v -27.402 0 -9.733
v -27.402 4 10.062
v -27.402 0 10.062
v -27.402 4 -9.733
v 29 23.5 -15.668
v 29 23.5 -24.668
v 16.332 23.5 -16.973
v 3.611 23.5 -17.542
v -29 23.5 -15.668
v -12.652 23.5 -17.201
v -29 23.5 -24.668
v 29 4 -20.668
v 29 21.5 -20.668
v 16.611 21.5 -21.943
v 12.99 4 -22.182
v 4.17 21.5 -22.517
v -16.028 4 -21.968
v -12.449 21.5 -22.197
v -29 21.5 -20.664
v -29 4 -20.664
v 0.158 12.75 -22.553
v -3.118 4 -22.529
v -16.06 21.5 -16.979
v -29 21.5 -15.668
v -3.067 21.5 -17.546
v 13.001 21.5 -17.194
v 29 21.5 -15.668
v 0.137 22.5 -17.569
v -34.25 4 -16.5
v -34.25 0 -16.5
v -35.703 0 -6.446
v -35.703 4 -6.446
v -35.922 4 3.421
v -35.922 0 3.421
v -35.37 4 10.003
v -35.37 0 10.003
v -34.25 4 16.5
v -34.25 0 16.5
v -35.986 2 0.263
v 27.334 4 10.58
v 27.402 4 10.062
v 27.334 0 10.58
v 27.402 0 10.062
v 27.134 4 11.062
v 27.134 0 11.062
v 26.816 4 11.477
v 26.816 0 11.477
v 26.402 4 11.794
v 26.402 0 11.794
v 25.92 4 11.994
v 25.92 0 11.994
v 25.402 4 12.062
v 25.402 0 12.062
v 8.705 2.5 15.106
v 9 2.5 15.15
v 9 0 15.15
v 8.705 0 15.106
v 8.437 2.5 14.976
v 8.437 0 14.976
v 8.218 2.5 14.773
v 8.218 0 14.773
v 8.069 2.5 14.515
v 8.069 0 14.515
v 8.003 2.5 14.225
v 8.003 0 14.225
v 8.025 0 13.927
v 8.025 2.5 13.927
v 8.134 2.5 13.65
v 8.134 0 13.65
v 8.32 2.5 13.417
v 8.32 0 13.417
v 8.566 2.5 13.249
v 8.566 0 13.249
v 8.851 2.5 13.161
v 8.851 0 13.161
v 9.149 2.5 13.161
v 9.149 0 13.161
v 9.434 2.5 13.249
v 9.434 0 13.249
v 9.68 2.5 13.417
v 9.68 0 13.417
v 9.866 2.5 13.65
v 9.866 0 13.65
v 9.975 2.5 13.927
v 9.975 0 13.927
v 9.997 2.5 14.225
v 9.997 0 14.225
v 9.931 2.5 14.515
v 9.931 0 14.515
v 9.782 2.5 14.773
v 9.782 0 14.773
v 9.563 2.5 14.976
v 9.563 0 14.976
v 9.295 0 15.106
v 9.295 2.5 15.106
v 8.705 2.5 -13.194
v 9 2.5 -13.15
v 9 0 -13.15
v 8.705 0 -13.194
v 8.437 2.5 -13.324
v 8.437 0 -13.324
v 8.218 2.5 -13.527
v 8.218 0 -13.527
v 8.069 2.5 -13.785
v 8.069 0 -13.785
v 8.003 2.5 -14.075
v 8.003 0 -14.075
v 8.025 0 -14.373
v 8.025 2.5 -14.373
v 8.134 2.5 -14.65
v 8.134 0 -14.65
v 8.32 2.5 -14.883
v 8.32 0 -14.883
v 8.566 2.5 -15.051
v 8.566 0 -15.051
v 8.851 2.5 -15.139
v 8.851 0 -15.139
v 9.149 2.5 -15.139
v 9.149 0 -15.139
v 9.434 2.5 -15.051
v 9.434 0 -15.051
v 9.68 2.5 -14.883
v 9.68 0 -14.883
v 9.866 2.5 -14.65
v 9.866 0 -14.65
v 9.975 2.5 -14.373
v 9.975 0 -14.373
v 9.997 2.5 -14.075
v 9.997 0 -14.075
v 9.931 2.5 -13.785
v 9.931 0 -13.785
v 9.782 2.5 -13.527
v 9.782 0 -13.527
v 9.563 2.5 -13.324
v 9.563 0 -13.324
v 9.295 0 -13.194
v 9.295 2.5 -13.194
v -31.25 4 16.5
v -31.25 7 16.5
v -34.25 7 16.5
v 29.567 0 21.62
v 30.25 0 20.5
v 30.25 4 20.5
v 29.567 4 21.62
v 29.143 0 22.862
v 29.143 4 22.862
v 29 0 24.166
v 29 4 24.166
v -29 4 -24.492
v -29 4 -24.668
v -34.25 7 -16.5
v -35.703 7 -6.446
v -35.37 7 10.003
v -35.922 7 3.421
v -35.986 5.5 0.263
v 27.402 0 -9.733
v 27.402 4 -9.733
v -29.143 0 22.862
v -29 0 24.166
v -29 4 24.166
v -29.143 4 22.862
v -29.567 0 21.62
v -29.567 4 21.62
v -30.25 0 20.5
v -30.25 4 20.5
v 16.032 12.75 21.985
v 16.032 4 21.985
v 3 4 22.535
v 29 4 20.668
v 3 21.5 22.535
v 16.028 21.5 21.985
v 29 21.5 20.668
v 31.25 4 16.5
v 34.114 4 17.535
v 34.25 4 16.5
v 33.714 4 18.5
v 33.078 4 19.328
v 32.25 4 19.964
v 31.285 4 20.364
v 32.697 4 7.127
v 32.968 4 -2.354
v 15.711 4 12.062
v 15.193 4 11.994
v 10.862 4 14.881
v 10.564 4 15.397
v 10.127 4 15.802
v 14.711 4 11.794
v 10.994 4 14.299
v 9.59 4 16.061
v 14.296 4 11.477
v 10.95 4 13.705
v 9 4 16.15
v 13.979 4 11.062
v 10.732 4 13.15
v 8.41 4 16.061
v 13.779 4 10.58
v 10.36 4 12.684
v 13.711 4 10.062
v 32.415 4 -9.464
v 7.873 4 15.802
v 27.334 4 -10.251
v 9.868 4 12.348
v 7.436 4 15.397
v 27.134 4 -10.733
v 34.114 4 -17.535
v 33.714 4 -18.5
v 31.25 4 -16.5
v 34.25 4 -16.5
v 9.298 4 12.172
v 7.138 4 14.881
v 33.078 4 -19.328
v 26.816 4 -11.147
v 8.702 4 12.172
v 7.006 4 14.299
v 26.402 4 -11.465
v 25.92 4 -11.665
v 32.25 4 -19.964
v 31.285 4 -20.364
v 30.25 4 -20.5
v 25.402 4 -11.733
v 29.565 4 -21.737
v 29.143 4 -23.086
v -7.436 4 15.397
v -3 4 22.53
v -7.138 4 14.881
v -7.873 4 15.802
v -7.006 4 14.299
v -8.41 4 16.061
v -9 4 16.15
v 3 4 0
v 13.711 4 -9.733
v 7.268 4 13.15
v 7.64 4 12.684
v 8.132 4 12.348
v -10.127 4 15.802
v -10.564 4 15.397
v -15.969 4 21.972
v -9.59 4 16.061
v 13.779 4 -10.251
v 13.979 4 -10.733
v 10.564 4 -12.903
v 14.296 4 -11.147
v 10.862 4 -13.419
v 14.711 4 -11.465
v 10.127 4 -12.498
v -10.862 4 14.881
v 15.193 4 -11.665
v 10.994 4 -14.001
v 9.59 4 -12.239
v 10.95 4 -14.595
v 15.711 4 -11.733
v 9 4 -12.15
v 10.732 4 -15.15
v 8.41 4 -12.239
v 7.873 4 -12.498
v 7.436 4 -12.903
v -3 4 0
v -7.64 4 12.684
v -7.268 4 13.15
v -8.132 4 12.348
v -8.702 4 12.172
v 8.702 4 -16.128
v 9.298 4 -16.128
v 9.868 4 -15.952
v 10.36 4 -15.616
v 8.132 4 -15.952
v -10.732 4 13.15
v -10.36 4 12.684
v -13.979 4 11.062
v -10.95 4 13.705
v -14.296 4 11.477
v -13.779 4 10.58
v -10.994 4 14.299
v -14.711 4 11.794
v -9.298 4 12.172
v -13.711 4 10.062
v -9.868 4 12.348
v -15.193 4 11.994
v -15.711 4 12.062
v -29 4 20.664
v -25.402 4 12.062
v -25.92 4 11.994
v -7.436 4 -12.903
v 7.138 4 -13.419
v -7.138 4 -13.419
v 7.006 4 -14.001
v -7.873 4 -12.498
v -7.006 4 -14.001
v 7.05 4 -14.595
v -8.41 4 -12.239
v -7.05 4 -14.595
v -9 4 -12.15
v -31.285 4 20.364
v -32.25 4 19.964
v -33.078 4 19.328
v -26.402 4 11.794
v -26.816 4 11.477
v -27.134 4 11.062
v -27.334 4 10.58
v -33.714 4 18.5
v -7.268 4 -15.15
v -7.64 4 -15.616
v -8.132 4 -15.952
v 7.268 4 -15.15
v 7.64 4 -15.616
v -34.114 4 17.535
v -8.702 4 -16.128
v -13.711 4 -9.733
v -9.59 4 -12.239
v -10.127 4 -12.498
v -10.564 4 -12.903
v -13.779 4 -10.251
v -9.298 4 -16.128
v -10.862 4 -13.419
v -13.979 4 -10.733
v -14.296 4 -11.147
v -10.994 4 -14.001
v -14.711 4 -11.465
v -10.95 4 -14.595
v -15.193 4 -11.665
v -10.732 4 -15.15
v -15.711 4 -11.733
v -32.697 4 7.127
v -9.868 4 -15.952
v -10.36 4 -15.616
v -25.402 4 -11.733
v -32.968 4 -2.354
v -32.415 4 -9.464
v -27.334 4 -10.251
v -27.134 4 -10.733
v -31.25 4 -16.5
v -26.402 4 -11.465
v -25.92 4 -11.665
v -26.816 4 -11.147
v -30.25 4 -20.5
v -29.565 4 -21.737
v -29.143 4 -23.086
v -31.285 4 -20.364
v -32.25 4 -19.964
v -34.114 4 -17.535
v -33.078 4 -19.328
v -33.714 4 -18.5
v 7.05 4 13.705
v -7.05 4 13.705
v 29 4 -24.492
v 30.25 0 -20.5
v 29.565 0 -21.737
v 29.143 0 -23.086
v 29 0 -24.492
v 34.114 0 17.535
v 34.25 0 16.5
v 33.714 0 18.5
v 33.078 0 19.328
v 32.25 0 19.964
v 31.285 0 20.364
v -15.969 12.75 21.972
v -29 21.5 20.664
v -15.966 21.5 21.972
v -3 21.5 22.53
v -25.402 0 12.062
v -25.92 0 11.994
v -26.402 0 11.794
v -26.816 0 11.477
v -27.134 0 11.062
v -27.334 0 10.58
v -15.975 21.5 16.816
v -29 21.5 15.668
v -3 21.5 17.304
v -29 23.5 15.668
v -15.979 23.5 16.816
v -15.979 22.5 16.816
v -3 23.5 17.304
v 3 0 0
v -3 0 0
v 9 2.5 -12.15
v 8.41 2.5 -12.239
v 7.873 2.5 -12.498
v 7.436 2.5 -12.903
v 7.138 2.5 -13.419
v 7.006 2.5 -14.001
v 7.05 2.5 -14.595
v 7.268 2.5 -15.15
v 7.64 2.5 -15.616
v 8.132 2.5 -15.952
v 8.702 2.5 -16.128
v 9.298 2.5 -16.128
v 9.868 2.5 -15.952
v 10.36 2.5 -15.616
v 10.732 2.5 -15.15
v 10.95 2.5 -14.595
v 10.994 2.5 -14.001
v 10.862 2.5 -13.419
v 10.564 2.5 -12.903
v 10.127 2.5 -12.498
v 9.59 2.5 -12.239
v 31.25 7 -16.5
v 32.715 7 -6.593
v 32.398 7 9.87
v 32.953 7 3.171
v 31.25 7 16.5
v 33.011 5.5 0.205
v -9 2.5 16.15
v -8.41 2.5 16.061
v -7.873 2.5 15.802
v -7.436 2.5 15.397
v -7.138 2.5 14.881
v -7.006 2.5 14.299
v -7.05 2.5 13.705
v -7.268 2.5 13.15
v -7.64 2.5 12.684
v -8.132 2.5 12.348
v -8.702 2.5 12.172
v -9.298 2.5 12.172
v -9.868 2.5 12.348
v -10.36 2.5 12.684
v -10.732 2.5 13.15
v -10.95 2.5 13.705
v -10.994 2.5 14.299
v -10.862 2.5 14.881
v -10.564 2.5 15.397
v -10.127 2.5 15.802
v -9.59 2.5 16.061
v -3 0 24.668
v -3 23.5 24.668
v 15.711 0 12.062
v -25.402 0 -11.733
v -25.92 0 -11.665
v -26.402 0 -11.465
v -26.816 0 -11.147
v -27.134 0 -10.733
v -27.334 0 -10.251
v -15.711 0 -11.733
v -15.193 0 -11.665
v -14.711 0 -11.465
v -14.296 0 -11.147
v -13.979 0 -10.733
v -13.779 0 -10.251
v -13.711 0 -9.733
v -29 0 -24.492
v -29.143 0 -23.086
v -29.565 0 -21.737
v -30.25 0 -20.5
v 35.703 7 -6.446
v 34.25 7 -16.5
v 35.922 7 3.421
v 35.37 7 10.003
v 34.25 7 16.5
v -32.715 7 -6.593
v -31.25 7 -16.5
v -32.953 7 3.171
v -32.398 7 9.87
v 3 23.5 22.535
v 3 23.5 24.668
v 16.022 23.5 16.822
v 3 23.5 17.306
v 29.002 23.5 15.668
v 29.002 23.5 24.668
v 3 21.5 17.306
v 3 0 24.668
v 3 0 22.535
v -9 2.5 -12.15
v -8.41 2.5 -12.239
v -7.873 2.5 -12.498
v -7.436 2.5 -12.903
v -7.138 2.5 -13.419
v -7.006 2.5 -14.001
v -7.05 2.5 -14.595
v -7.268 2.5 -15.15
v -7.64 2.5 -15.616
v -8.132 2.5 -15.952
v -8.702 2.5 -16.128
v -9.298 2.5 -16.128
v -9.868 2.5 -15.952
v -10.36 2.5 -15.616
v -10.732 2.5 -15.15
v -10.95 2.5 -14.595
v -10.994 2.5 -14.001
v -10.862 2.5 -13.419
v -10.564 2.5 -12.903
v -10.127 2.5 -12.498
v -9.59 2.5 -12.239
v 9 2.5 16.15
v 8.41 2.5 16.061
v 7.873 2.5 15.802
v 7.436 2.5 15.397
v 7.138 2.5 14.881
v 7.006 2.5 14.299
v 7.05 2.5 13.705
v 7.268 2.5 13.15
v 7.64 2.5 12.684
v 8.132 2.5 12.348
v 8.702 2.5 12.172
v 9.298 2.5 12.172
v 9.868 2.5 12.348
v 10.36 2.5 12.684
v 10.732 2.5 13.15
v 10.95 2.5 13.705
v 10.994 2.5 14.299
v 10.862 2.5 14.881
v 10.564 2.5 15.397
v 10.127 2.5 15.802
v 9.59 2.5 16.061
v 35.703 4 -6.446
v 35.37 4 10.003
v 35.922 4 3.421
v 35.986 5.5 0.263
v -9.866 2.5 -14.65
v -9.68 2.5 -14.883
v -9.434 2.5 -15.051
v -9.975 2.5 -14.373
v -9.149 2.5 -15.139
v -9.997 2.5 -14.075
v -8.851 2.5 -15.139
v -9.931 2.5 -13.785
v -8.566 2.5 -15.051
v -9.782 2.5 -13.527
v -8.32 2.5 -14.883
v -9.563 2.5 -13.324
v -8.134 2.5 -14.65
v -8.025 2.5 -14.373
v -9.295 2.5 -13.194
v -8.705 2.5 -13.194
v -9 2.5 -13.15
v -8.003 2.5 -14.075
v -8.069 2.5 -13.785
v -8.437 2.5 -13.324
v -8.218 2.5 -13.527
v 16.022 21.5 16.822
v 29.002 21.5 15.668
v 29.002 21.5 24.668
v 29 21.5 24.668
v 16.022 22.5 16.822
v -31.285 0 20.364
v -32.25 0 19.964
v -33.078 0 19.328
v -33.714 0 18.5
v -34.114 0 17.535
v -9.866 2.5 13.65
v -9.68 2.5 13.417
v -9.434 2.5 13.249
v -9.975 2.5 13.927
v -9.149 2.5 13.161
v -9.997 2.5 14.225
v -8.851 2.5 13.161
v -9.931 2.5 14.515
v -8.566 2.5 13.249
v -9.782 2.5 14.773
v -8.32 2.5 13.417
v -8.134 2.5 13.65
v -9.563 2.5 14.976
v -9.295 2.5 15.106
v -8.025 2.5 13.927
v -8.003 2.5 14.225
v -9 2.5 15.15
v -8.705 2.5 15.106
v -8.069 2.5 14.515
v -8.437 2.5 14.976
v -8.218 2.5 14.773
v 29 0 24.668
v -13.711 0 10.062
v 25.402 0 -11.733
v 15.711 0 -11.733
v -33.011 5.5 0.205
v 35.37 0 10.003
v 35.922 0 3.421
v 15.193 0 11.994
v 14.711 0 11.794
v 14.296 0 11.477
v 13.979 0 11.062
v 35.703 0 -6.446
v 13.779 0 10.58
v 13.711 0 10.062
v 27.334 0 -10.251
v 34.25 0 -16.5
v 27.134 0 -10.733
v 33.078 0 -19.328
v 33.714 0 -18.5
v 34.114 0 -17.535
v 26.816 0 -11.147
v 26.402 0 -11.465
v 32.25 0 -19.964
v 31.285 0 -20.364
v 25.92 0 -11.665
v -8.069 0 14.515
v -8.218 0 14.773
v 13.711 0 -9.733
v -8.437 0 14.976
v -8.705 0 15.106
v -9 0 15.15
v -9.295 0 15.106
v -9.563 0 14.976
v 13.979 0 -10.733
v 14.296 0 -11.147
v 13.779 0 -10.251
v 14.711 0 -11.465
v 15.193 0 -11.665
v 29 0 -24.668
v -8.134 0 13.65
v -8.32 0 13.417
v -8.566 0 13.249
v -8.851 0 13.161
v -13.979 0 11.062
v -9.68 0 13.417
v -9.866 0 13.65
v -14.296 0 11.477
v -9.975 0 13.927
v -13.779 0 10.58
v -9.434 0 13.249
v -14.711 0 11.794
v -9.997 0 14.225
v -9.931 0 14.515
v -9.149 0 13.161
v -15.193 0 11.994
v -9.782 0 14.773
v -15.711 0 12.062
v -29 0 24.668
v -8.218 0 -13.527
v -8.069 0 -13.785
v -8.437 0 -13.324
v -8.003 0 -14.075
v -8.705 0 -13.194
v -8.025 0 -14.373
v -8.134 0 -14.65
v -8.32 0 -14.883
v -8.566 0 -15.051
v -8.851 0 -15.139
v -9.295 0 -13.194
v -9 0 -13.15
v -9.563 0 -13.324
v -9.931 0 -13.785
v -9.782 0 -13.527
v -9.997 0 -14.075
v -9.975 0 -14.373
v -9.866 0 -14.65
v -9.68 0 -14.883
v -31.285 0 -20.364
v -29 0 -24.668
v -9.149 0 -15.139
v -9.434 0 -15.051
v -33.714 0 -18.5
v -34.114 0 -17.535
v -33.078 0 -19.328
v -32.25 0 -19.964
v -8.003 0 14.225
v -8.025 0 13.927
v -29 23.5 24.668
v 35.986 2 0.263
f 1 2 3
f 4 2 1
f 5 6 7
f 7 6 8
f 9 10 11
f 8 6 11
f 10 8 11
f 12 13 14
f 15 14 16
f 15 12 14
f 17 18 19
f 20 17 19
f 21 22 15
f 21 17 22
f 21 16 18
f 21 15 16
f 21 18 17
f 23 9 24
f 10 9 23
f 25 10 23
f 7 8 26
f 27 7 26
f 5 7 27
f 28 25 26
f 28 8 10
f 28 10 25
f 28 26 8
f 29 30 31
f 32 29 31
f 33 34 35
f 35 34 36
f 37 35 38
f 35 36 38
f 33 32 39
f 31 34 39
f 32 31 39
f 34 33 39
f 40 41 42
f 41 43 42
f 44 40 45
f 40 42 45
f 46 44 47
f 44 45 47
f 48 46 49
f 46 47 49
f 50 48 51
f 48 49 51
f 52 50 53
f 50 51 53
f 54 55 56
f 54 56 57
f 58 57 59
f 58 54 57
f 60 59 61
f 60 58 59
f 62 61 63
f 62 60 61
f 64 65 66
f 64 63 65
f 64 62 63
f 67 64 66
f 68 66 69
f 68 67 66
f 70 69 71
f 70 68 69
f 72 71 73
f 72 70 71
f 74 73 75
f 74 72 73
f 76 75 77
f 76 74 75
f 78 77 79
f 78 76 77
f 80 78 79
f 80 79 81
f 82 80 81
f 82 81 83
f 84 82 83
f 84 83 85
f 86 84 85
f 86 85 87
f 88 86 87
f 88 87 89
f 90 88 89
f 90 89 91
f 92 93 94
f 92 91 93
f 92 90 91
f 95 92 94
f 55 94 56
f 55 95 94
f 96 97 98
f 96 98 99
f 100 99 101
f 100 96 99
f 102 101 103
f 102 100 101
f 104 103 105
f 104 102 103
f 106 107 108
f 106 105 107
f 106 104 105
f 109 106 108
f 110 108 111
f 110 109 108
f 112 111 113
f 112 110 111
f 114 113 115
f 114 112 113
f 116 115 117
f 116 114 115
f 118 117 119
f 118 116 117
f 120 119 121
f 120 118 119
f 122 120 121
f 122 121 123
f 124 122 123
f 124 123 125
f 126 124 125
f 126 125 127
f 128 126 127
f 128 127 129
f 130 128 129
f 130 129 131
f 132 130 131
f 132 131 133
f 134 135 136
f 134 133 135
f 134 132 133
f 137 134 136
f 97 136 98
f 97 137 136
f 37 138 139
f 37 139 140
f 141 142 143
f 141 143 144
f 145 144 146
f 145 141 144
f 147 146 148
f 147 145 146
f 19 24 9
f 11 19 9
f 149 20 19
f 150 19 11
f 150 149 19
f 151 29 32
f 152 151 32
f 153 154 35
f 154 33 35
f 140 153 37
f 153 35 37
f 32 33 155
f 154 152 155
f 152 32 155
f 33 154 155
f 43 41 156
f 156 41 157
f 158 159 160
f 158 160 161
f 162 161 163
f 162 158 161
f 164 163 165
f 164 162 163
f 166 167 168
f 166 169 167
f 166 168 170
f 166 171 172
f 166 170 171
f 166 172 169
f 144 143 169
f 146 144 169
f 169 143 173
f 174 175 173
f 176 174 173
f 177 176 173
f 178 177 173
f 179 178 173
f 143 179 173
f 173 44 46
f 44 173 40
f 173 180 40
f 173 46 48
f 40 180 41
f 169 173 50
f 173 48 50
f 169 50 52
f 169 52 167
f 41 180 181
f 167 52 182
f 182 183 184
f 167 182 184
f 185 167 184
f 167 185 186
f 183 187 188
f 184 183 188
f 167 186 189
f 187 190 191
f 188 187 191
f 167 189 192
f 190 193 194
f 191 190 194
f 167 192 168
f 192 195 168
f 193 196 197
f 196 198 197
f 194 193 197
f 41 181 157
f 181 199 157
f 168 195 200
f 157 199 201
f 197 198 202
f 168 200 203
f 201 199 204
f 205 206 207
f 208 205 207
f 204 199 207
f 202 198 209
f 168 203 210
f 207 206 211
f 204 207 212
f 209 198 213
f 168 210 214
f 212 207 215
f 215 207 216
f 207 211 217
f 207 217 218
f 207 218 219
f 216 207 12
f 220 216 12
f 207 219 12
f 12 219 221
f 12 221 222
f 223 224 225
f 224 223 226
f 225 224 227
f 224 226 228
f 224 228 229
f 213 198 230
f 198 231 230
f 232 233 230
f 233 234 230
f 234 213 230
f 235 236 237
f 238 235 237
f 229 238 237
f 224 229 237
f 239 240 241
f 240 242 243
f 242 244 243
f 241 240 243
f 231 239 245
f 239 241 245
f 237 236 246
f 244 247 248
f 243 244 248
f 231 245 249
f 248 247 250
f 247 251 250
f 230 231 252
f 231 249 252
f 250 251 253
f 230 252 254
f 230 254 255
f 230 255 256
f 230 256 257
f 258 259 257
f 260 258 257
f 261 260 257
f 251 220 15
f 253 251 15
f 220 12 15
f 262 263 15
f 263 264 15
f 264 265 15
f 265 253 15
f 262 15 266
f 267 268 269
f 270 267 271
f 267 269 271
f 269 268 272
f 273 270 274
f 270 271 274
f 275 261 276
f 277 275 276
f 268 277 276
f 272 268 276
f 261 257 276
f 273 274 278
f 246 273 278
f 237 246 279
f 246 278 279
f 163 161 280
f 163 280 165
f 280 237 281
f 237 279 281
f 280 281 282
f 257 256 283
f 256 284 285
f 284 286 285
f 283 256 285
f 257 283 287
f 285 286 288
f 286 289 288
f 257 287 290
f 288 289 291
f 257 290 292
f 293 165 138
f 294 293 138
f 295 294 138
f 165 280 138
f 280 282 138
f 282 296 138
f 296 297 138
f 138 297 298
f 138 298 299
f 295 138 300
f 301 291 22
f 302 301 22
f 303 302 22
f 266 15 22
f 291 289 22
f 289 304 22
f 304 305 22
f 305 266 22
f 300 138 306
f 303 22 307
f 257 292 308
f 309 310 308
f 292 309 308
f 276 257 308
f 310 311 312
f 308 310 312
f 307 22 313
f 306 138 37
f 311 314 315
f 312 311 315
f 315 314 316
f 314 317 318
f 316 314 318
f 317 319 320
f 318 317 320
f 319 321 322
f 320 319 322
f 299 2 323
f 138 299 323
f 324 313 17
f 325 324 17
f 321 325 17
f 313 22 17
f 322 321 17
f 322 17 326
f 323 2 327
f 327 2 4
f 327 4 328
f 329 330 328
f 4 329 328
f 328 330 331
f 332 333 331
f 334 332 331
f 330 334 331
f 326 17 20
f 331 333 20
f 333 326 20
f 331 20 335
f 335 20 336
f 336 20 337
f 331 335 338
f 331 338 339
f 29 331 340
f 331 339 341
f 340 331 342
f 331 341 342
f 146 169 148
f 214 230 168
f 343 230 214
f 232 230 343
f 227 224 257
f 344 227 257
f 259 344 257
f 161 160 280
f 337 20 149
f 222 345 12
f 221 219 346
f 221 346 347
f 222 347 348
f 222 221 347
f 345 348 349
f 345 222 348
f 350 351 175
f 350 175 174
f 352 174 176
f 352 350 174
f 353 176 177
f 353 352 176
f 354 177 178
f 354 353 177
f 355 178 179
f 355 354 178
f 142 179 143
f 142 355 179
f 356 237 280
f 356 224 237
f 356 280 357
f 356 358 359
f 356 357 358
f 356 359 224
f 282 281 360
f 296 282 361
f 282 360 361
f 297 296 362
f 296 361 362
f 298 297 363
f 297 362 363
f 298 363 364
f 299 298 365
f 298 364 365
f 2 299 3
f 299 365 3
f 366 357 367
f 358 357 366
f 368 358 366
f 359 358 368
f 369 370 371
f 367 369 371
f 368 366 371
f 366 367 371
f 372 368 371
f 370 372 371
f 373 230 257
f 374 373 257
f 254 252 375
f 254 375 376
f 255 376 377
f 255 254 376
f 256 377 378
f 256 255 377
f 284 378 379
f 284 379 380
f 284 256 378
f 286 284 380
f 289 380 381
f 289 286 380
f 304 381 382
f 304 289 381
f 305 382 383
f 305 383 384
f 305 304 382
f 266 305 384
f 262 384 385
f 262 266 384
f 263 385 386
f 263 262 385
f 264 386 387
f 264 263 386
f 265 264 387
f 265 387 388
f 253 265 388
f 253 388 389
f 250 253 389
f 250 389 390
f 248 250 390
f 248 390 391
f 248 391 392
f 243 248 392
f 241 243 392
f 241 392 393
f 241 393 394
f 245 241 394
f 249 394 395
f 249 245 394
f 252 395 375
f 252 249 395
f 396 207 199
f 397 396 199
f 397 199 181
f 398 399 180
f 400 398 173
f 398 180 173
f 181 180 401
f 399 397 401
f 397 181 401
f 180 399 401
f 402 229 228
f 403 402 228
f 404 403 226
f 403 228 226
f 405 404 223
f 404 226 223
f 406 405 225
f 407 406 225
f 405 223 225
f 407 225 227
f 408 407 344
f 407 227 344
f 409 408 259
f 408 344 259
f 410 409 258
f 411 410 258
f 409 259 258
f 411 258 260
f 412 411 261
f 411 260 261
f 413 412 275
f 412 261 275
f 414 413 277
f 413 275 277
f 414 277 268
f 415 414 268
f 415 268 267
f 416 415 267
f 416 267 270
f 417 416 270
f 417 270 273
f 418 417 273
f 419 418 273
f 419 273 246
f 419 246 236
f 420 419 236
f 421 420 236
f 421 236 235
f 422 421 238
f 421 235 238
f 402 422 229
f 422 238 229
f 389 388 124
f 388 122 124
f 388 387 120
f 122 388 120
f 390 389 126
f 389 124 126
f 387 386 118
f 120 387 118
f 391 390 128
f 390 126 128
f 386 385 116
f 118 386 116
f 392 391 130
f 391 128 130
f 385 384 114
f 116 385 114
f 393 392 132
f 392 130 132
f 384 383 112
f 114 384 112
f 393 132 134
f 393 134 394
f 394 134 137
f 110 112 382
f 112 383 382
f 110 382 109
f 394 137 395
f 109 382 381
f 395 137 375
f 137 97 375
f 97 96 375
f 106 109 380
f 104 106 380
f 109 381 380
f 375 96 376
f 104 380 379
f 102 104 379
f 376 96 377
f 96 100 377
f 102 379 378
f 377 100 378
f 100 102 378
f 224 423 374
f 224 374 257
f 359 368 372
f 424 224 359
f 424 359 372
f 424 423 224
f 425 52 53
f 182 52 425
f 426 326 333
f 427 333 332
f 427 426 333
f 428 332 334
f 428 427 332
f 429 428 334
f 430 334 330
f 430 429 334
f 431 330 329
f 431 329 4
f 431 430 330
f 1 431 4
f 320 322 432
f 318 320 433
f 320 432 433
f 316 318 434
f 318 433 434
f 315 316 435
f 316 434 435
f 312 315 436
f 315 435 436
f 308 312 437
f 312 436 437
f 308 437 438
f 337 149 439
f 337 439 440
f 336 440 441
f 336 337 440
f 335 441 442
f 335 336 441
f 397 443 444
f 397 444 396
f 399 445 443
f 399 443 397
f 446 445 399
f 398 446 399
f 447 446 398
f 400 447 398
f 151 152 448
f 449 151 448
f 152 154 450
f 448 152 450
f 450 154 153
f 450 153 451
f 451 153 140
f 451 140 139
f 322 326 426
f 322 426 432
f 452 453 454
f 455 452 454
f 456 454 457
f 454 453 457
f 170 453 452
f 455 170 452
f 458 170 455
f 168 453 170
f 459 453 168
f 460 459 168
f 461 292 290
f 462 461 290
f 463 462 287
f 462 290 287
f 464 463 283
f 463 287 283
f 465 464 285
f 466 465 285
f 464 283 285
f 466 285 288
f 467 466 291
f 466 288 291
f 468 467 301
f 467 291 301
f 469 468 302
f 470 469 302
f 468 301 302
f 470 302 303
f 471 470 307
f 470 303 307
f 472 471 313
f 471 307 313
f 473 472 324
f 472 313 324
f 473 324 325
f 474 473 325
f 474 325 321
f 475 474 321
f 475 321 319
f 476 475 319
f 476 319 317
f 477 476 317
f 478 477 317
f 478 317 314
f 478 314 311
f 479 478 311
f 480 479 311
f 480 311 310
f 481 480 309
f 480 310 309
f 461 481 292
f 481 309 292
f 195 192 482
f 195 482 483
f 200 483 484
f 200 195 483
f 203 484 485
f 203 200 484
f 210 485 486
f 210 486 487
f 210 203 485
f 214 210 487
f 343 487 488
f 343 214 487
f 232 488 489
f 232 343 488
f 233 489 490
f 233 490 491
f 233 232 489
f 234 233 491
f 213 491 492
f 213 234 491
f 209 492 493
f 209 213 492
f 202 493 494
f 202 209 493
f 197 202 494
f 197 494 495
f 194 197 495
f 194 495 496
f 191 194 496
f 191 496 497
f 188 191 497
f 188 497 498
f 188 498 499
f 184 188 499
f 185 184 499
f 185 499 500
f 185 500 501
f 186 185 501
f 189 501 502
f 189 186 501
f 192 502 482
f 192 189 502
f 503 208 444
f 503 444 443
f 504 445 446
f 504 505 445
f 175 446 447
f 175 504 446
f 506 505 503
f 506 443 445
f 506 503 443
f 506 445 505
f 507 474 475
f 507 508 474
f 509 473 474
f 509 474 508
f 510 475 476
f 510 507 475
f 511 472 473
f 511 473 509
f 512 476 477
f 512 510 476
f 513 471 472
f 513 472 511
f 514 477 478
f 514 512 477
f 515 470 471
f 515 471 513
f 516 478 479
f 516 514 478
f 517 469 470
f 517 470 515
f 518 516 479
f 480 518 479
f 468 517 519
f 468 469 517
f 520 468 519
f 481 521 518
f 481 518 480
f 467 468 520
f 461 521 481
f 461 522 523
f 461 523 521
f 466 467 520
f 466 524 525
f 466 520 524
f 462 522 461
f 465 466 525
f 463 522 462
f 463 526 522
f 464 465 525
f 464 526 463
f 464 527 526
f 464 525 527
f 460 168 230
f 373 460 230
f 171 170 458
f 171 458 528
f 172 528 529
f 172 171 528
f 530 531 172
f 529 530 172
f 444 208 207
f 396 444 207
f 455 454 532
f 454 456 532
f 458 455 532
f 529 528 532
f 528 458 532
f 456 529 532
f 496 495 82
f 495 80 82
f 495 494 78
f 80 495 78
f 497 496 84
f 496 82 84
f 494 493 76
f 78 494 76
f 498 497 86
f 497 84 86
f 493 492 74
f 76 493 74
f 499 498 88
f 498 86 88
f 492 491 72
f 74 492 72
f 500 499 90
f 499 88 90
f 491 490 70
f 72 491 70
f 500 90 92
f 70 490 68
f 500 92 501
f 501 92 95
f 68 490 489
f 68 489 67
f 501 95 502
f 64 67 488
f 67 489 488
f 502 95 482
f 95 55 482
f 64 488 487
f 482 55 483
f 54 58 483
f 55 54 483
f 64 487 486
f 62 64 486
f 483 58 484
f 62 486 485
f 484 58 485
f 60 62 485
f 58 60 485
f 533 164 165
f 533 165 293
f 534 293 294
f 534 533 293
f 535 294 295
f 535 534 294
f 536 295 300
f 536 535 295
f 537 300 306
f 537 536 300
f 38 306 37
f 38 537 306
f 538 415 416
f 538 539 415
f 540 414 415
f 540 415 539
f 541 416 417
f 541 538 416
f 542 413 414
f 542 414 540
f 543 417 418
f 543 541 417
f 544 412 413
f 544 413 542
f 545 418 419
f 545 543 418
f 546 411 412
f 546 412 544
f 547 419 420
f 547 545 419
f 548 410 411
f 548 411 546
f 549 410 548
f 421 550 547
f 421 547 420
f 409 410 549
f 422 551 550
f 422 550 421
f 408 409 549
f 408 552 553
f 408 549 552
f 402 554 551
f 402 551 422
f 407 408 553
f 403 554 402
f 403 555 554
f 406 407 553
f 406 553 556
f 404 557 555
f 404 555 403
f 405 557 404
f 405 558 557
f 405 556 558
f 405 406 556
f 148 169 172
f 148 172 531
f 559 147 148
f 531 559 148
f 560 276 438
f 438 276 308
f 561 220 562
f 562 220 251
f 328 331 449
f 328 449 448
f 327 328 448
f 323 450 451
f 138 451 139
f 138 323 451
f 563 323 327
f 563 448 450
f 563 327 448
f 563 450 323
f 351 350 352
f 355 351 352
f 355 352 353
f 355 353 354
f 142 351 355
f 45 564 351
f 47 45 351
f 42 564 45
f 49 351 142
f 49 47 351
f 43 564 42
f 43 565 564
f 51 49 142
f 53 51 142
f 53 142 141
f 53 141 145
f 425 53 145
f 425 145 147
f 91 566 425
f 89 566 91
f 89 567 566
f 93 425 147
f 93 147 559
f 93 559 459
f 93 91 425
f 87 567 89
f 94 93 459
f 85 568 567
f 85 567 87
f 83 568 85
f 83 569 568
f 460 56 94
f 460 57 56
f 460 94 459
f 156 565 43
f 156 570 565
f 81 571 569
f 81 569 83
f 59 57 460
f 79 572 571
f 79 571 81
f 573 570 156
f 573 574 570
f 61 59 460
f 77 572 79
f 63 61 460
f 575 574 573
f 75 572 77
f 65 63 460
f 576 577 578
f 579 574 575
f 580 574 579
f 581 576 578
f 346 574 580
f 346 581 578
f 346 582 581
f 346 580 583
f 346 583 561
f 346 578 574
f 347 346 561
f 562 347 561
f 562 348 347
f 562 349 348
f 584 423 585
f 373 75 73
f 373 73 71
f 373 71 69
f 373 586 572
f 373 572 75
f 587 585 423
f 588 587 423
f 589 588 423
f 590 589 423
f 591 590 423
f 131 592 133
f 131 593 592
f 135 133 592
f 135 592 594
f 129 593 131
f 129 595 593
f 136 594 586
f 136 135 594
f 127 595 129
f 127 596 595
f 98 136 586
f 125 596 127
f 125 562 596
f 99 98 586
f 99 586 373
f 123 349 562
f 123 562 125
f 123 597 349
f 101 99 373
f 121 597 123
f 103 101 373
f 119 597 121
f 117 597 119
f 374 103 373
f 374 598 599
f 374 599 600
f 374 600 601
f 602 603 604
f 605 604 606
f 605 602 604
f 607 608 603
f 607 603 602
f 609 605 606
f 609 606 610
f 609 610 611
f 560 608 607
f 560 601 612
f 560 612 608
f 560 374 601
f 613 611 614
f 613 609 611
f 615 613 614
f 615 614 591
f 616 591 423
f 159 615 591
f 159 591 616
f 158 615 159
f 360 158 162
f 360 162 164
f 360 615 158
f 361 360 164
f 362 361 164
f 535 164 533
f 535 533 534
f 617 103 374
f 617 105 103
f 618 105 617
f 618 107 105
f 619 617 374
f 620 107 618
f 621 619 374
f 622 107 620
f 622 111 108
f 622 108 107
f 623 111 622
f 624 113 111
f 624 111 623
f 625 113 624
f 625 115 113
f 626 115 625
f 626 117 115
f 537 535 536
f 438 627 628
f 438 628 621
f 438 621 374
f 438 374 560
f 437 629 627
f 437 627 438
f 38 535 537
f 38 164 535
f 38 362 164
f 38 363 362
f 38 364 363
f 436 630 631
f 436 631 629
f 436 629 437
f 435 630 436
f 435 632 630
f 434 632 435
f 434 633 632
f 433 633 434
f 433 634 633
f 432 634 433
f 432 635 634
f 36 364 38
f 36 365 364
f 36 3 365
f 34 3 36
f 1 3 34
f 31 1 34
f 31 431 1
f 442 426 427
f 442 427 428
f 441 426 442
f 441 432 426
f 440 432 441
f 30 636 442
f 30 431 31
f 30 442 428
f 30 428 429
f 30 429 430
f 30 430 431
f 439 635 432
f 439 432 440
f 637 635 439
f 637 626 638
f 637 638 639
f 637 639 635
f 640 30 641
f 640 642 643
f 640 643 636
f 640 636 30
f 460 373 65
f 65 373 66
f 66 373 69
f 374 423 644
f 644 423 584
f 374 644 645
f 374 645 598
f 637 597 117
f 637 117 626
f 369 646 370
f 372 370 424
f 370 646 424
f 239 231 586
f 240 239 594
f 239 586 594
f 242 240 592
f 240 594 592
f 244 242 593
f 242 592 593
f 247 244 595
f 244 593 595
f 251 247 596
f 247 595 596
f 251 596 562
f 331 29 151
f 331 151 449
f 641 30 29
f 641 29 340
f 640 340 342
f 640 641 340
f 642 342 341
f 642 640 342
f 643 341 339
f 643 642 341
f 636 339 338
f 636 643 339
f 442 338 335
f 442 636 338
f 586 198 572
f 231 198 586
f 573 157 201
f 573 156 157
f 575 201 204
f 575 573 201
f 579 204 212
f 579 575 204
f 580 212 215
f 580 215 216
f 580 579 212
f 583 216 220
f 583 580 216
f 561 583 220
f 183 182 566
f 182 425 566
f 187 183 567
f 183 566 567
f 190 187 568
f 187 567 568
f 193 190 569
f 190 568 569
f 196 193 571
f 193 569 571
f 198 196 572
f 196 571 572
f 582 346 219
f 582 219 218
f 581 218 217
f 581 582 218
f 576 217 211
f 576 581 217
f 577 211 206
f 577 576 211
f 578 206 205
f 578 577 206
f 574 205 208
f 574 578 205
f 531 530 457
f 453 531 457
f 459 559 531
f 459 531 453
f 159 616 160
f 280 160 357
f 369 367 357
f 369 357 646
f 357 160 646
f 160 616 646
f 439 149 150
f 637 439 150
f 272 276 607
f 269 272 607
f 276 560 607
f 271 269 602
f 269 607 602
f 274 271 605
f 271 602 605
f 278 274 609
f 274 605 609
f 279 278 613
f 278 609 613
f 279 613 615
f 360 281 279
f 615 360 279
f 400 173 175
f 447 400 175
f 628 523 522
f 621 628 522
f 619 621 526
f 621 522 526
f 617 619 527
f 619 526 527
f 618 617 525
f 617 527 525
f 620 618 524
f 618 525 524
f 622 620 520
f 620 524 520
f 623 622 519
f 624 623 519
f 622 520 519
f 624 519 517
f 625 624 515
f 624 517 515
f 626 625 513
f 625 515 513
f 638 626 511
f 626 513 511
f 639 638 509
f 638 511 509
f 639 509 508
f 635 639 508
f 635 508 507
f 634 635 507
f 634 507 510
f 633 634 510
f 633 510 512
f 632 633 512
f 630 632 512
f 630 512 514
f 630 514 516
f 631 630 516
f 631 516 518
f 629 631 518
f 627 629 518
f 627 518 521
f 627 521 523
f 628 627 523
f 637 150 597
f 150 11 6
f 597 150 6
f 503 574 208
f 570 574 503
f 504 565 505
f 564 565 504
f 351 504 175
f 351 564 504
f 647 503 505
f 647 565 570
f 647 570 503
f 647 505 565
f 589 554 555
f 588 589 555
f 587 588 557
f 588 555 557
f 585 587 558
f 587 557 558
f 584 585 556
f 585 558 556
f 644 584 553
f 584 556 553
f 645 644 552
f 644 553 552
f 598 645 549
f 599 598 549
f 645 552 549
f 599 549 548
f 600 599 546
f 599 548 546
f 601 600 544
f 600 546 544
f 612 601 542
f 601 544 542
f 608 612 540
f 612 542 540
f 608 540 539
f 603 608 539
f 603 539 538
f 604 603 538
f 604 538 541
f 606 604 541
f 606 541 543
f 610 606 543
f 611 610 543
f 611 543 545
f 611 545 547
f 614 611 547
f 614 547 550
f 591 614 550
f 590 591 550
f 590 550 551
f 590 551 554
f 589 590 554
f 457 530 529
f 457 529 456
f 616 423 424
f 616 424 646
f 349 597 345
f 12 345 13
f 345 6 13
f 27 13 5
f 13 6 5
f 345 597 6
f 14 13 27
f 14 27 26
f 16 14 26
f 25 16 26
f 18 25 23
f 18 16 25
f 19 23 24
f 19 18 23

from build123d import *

# Parameters (mm, degrees)
BOSS_EXTRUDE1_DEPTH   = 4
CUT_EXTRUDE1_DEPTH    = 17
BOSS_EXTRUDE2_DEPTH   = 19.5
BOSS_EXTRUDE3_DEPTH   = 4
SKETCH6_W             = 58
SKETCH6_H             = 2
BOSS_EXTRUDE4_DEPTH   = 9
CUT_EXTRUDE2_DEPTH    = 7
FILLET1_R             = 7
BOSS_EXTRUDE5_DEPTH   = 23.5
SKETCH9_W             = 26
SKETCH9_H             = 2
SKETCH9_W_2           = 26.001587477
BOSS_EXTRUDE6_DEPTH   = 9
CUT_EXTRUDE3_DEPTH    = 10
SKETCH11_R            = 1
CUT_EXTRUDE4_DEPTH    = 10
SKETCH12_R            = 2
CUT_EXTRUDE5_DEPTH    = 1.5
SKETCH13_W            = 13.69136931
SKETCH13_H            = 23.795369164
CUT_EXTRUDE6_DEPTH    = 21.5
FILLET2_R             = 2
FILLET2_OF_MIRROR11_R = 2
FILLET3_R             = 6
BOSS_EXTRUDE7_DEPTH   = 7


with BuildPart() as part:
    # Sketch1 → Boss-Extrude1 (new body)
    with BuildSketch(Plane(origin=(0, 0, 0), x_dir=(1, 0, 0), z_dir=(0, 1, 0))):
        with BuildLine():
            ThreePointArc((30.25, 20.5), (33.078427125, 19.328427125), (34.25, 16.5))
            add(Edge.make_bspline(
                [(34.25, 16.5), (37.722666951, -0.526670932), (34.25, -16.5)],
                knots=[0, 0, 0, 0.709821526, 0.709821526, 0.709821526], degree=2))
            ThreePointArc((34.25, -16.5), (33.078427125, -19.328427125), (30.25, -20.5))
            add(Edge.make_bspline(
                [(-30.25, -20.5), (0.344261678, -24.605611324), (30.25, -20.5)],
                knots=[0, 0, 0, 0.814994135, 0.814994135, 0.814994135], degree=2))
            ThreePointArc((-30.25, -20.5), (-33.078427125, -19.328427125), (-34.25, -16.5))
            add(Edge.make_bspline(
                [(-34.25, 16.5), (-37.722666951, -0.526670933), (-34.25, -16.5)],
                knots=[0, 0, 0, 0.709821526, 0.709821526, 0.709821526], degree=2))
            ThreePointArc((-34.25, 16.5), (-33.078427125, 19.328427125), (-30.25, 20.5))
            add(Edge.make_bspline(
                [(-30.25, 20.5), (0.344261678, 24.605611324), (30.25, 20.5)],
                knots=[0, 0, 0, 0.814994135, 0.814994135, 0.814994135], degree=2))
        make_face()
    extrude(amount=BOSS_EXTRUDE1_DEPTH)

    # Sketch2 → Cut-Extrude1 (cut)
    with BuildSketch(Plane(origin=(0, 4, 0), x_dir=(1, 0, 0), z_dir=(0, 1, 0))):
        with BuildLine():
            Line((-3, 0), (-3, -22.530259042))
            add(Edge.make_bspline(
                [(-3, -22.530259042), (0.003385515, -22.572928062), (3, -22.534846829)],
                knots=[0, 0, 0, 1, 1, 1], degree=2))
            Line((3, -22.534846829), (3, 0))
            Line((3, 0), (-3, 0))
        make_face()
    extrude(amount=-CUT_EXTRUDE1_DEPTH, mode=Mode.SUBTRACT)



with BuildPart() as body_2:
    # Sketch3 → Boss-Extrude2 (new body)
    with BuildSketch(Plane(origin=(0, 4, 0), x_dir=(1, 0, 0), z_dir=(0, 1, 0))):
        with BuildLine():
            Line((-29, 20.664354546), (-29, 24.667980394))
            Line((-29, 24.667980394), (29, 24.667980394))
            Line((29, 24.667980394), (29, 20.667980394))
            add(Edge.make_bspline(
                [(29, 20.667980394), (0.316394821, 24.439442983), (-29, 20.664354546)],
                knots=[0, 0, 0, 1, 1, 1], degree=2))
        make_face()
    extrude(amount=BOSS_EXTRUDE2_DEPTH)


with BuildPart() as part_1:
    add(part.part)

    add(body_2.part)  # Boss-Extrude3 merges body 2
    # Sketch4 → Boss-Extrude3 (add)
    with BuildSketch(Plane.XZ.offset(-4)):
        with BuildLine():
            Line((-29.000000006, -20.664354545), (-29, -24.667980394))
            Line((-29, -24.667980394), (29, -24.667980394))
            Line((29, -24.667980394), (29, -20.667980394))
            add(Edge.make_bspline(
                [(29, -20.667980394), (0.316394818, -24.439442983), (-29.000000006, -20.664354545)],
                knots=[0, 0, 0, 1, 1, 1], degree=2))
        make_face()
    extrude(amount=BOSS_EXTRUDE3_DEPTH)

    # Sketch6 → Boss-Extrude4 (add)
    with BuildSketch(Plane(origin=(0, 0, -24.667980394), x_dir=(-1, 0, 0), z_dir=(0, 0, -1))):
        with Locations((0, 22.5)):
            Rectangle(SKETCH6_W, SKETCH6_H)
    extrude(amount=-BOSS_EXTRUDE4_DEPTH)

    # Sketch7 → Cut-Extrude2 (cut)
    with BuildSketch(Plane(origin=(0, 23.5, 0), x_dir=(1, 0, 0), z_dir=(0, 1, 0))):
        with BuildLine():
            Line((-29, 15.667980394), (29, 15.667980394))
            add(Edge.make_bspline(
                [(-29, 15.667980394), (0.2737777, 19.470424078), (29, 15.667980394)],
                knots=[0, 0, 0, 0.915261327, 0.915261327, 0.915261327], degree=2))
        make_face()
    extrude(amount=-CUT_EXTRUDE2_DEPTH, mode=Mode.SUBTRACT)

    # Fillet1
    # the kernel refuses this fillet: 7 mm, written as the material it adds along each edge
    with BuildSketch(Plane(origin=(-29.000000006, 4, -20.664354545), x_dir=(-0.9914665134907249, 0, 0.13036162252191422), z_dir=(0, -1, 0))) as fillet1_piece_1:
        with BuildLine():
            CenterArc((6.441264071, 4.707691972), FILLET1_R, 187.490489673, 34.771943947)
            Line((-0.499001522, 3.795160604), (-0.637806834, 3.776909977))
            Line((-0.637806834, 3.776909977), (-0.138805312, -0.018250627))
            Line((-0.138805312, -0.018250627), (0.000373506, -0.139999502))
            ThreePointArc((0.000373506, -0.139999502), (0.630379223, -0.139159591), (1.157148553, -0.094153839))
            Line((1.157148553, -0.094153839), (1.260758661, 0))
        make_face()
    extrude(amount=4)
    with BuildSketch(Plane(origin=(29, 4, -20.667980394), x_dir=(0.9910909157815452, 0, 0.13318707390470766), z_dir=(0, -1, 0))) as fillet1_piece_2:
        with BuildLine():
            CenterArc((6.428302474, -4.722438864), FILLET1_R, 137.57425577, 34.771944029)
            Line((-0.509333936, -3.790129346), (-0.648086665, -3.771483156))
            Line((-0.648086665, -3.771483156), (-0.138752728, 0.01864619))
            Line((-0.138752728, 0.01864619), (0.000398861, 0.139999432))
            ThreePointArc((0.000398861, 0.139999432), (0.630618203, 0.139101807), (1.157895141, 0.094448777))
            Line((1.157895141, 0.094448777), (1.261236462, 0))
        make_face()
    extrude(amount=4)

    # Sketch8 → Boss-Extrude5 (add)
    with BuildSketch(Plane.XZ):
        with BuildLine():
            add(Edge.make_bspline(
                [(2.999999846, 22.534846831), (16.064348435, 22.368823982), (29, 20.667980394)],
                knots=[0, 0, 0, 0.953900197, 0.953900197, 0.953900197], degree=2))
            Line((29, 20.667980394), (29, 24.667980394))
            Line((29, 24.667980394), (2.999999846, 24.667980394))
            Line((2.999999846, 24.667980394), (2.999999846, 22.534846831))
        make_face()
        with BuildLine():
            Line((-3, 24.667980394), (-29, 24.667980394))
            Line((-29, 24.667980394), (-29, 20.664354545))
            add(Edge.make_bspline(
                [(-29, 20.664354545), (-15.937182308, 22.346460832), (-3, 22.530259042)],
                knots=[0.045651019, 0.045651019, 0.045651019, 1, 1, 1], degree=2))
            Line((-3, 22.530259042), (-3, 24.667980394))
        make_face()
    extrude(amount=-BOSS_EXTRUDE5_DEPTH)

    # Sketch9 → Boss-Extrude6 (add)
    with BuildSketch(Plane.XY.offset(24.667980394)):
        with Locations((-16, 22.5)):
            Rectangle(SKETCH9_W, SKETCH9_H)
        with Locations((16.000793585, 22.5)):
            Rectangle(SKETCH9_W_2, SKETCH9_H)
    extrude(amount=-BOSS_EXTRUDE6_DEPTH)

    # Sketch10 → Cut-Extrude3 (cut)
    with BuildSketch(Plane(origin=(0, 23.5, 0), x_dir=(1, 0, 0), z_dir=(0, 1, 0))):
        with BuildLine():
            Line((-29, -15.667980394), (29.001587323, -15.667980394))
            add(Edge.make_bspline(
                [(-29, -15.667980394), (0.20822973, -18.978019575), (29.001587323, -15.667980394)],
                knots=[0, 0, 0, 0.914206728, 0.914206728, 0.914206728], degree=2))
        make_face()
    extrude(amount=-CUT_EXTRUDE3_DEPTH, mode=Mode.SUBTRACT)

    # Sketch11 → Cut-Extrude4 (cut)
    with BuildSketch(Plane(origin=(0, 4, 0), x_dir=(1, 0, 0), z_dir=(0, 1, 0))):
        with Locations(Location((-9, 14.15, 0), (0, 0, 270))):
            Circle(SKETCH11_R)
        with Locations(Location((-9, -14.15, 0), (0, 0, 270))):
            Circle(SKETCH11_R)
    cut_extrude4 = extrude(amount=-CUT_EXTRUDE4_DEPTH, mode=Mode.SUBTRACT)

    # Sketch12 → Cut-Extrude5 (cut)
    with BuildSketch(Plane(origin=(0, 4, 0), x_dir=(1, 0, 0), z_dir=(0, 1, 0))):
        with Locations(Location((-9, 14.15, 0), (0, 0, 270))):
            Circle(SKETCH12_R)
        with Locations(Location((-9, -14.15, 0), (0, 0, 270))):
            Circle(SKETCH12_R)
    cut_extrude5 = extrude(amount=-CUT_EXTRUDE5_DEPTH, mode=Mode.SUBTRACT)

    # Mirror10: Cut-Extrude4, Cut-Extrude5 across plane
    add(cut_extrude4.mirror(Plane.ZY), mode=Mode.SUBTRACT)
    add(cut_extrude5.mirror(Plane.ZY), mode=Mode.SUBTRACT)

    # Sketch13 → Cut-Extrude6 (cut)
    with BuildSketch(Plane(origin=(0, 4, 0), x_dir=(1, 0, 0), z_dir=(0, 1, 0))):
        with Locations((-20.556344598, -0.164609633)):
            Rectangle(SKETCH13_W, SKETCH13_H)
    cut_extrude6 = extrude(amount=-CUT_EXTRUDE6_DEPTH, mode=Mode.SUBTRACT)

    # Fillet2
    fillet2_edges = [part_1.edges().sort_by_distance(p)[0] for p in [
        (-13.710659943, 2, -11.733074949),
        (-13.710659943, 2, 12.062294215),
        (-27.402029253, 2, 12.062294215),
        (-27.402029253, 2, -11.733074949),
    ]]
    fillet(fillet2_edges, radius=FILLET2_R)

    # Mirror11: Cut-Extrude6 across plane
    add(cut_extrude6.mirror(Plane.ZY), mode=Mode.SUBTRACT)

    # Fillet2 of Mirror11
    fillet2_of_mirror11_edges = [part_1.edges().sort_by_distance(p)[0] for p in [
        (13.710659959, 2, -11.73307493),
        (13.710659926, 2, 12.062294234),
        (27.402029236, 2, 12.062294253),
        (27.40202927, 2, -11.733074911),
    ]]
    fillet(fillet2_of_mirror11_edges, radius=FILLET2_OF_MIRROR11_R)

    # Fillet3
    # the kernel refuses this fillet: 6 mm, written as the material it adds along each edge
    with BuildSketch(Plane(origin=(-29, 0, 20.664354545), x_dir=(-0.9914665134873252, 0, -0.13036162254777076), z_dir=(0, 1, 0))) as fillet3_piece_1:
        with BuildLine():
            CenterArc((5.492355455, 4.253655913), FILLET3_R, 187.490489592, 37.658462004)
            Line((-0.456443626, 3.471486178), (-0.575419608, 3.455842783))
            Line((-0.575419608, 3.455842783), (-0.118975982, -0.015643395))
            Line((-0.118975982, -0.015643395), (0.000320148, -0.119999573))
            ThreePointArc((0.000320148, -0.119999573), (0.630379241, -0.119159591), (1.176126731, -0.085073118))
            Line((1.176126731, -0.085073118), (1.260758667, 0))
        make_face()
    extrude(amount=4)
    with BuildSketch(Plane(origin=(29, 0, 20.667980394), x_dir=(0.9910909157697056, 0, -0.1331870739928102), z_dir=(0, 1, 0))) as fillet3_piece_2:
        with BuildLine():
            CenterArc((5.480691848, -4.265699972), FILLET3_R, 134.68773779, 37.658462005)
            Line((-0.465853647, -3.466577528), (-0.584784557, -3.450595079))
            Line((-0.584784557, -3.450595079), (-0.11893091, 0.015982449))
            Line((-0.11893091, 0.015982449), (0.000341881, 0.119999513))
            ThreePointArc((0.000341881, 0.119999513), (0.630618207, 0.119101807), (1.176847354, 0.085313999))
            Line((1.176847354, 0.085313999), (1.261236462, 0))
        make_face()
    extrude(amount=4)

    # Sketch14 → Boss-Extrude7 (add)
    with BuildSketch(Plane.XZ):
        with BuildLine():
            Line((-31.25, 16.5), (-34.25, 16.5))
            add(Edge.make_bspline(
                [(-34.25, -16.5), (-37.722666951, 0.526670933), (-34.25, 16.5)],
                knots=[0, 0, 0, 1, 1, 1], degree=2))
            Line((-34.25, -16.5), (-31.25, -16.5))
            add(Edge.make_bspline(
                [(-31.25, -16.5), (-34.771209982, 0.410301421), (-31.25, 16.5)],
                knots=[0, 0, 0, 1, 1, 1], degree=2))
        make_face()
    boss_extrude7 = extrude(amount=-BOSS_EXTRUDE7_DEPTH)

    # Mirror12: Boss-Extrude7 across plane
    add(boss_extrude7.mirror(Plane.ZY))


solid = part_1.part
